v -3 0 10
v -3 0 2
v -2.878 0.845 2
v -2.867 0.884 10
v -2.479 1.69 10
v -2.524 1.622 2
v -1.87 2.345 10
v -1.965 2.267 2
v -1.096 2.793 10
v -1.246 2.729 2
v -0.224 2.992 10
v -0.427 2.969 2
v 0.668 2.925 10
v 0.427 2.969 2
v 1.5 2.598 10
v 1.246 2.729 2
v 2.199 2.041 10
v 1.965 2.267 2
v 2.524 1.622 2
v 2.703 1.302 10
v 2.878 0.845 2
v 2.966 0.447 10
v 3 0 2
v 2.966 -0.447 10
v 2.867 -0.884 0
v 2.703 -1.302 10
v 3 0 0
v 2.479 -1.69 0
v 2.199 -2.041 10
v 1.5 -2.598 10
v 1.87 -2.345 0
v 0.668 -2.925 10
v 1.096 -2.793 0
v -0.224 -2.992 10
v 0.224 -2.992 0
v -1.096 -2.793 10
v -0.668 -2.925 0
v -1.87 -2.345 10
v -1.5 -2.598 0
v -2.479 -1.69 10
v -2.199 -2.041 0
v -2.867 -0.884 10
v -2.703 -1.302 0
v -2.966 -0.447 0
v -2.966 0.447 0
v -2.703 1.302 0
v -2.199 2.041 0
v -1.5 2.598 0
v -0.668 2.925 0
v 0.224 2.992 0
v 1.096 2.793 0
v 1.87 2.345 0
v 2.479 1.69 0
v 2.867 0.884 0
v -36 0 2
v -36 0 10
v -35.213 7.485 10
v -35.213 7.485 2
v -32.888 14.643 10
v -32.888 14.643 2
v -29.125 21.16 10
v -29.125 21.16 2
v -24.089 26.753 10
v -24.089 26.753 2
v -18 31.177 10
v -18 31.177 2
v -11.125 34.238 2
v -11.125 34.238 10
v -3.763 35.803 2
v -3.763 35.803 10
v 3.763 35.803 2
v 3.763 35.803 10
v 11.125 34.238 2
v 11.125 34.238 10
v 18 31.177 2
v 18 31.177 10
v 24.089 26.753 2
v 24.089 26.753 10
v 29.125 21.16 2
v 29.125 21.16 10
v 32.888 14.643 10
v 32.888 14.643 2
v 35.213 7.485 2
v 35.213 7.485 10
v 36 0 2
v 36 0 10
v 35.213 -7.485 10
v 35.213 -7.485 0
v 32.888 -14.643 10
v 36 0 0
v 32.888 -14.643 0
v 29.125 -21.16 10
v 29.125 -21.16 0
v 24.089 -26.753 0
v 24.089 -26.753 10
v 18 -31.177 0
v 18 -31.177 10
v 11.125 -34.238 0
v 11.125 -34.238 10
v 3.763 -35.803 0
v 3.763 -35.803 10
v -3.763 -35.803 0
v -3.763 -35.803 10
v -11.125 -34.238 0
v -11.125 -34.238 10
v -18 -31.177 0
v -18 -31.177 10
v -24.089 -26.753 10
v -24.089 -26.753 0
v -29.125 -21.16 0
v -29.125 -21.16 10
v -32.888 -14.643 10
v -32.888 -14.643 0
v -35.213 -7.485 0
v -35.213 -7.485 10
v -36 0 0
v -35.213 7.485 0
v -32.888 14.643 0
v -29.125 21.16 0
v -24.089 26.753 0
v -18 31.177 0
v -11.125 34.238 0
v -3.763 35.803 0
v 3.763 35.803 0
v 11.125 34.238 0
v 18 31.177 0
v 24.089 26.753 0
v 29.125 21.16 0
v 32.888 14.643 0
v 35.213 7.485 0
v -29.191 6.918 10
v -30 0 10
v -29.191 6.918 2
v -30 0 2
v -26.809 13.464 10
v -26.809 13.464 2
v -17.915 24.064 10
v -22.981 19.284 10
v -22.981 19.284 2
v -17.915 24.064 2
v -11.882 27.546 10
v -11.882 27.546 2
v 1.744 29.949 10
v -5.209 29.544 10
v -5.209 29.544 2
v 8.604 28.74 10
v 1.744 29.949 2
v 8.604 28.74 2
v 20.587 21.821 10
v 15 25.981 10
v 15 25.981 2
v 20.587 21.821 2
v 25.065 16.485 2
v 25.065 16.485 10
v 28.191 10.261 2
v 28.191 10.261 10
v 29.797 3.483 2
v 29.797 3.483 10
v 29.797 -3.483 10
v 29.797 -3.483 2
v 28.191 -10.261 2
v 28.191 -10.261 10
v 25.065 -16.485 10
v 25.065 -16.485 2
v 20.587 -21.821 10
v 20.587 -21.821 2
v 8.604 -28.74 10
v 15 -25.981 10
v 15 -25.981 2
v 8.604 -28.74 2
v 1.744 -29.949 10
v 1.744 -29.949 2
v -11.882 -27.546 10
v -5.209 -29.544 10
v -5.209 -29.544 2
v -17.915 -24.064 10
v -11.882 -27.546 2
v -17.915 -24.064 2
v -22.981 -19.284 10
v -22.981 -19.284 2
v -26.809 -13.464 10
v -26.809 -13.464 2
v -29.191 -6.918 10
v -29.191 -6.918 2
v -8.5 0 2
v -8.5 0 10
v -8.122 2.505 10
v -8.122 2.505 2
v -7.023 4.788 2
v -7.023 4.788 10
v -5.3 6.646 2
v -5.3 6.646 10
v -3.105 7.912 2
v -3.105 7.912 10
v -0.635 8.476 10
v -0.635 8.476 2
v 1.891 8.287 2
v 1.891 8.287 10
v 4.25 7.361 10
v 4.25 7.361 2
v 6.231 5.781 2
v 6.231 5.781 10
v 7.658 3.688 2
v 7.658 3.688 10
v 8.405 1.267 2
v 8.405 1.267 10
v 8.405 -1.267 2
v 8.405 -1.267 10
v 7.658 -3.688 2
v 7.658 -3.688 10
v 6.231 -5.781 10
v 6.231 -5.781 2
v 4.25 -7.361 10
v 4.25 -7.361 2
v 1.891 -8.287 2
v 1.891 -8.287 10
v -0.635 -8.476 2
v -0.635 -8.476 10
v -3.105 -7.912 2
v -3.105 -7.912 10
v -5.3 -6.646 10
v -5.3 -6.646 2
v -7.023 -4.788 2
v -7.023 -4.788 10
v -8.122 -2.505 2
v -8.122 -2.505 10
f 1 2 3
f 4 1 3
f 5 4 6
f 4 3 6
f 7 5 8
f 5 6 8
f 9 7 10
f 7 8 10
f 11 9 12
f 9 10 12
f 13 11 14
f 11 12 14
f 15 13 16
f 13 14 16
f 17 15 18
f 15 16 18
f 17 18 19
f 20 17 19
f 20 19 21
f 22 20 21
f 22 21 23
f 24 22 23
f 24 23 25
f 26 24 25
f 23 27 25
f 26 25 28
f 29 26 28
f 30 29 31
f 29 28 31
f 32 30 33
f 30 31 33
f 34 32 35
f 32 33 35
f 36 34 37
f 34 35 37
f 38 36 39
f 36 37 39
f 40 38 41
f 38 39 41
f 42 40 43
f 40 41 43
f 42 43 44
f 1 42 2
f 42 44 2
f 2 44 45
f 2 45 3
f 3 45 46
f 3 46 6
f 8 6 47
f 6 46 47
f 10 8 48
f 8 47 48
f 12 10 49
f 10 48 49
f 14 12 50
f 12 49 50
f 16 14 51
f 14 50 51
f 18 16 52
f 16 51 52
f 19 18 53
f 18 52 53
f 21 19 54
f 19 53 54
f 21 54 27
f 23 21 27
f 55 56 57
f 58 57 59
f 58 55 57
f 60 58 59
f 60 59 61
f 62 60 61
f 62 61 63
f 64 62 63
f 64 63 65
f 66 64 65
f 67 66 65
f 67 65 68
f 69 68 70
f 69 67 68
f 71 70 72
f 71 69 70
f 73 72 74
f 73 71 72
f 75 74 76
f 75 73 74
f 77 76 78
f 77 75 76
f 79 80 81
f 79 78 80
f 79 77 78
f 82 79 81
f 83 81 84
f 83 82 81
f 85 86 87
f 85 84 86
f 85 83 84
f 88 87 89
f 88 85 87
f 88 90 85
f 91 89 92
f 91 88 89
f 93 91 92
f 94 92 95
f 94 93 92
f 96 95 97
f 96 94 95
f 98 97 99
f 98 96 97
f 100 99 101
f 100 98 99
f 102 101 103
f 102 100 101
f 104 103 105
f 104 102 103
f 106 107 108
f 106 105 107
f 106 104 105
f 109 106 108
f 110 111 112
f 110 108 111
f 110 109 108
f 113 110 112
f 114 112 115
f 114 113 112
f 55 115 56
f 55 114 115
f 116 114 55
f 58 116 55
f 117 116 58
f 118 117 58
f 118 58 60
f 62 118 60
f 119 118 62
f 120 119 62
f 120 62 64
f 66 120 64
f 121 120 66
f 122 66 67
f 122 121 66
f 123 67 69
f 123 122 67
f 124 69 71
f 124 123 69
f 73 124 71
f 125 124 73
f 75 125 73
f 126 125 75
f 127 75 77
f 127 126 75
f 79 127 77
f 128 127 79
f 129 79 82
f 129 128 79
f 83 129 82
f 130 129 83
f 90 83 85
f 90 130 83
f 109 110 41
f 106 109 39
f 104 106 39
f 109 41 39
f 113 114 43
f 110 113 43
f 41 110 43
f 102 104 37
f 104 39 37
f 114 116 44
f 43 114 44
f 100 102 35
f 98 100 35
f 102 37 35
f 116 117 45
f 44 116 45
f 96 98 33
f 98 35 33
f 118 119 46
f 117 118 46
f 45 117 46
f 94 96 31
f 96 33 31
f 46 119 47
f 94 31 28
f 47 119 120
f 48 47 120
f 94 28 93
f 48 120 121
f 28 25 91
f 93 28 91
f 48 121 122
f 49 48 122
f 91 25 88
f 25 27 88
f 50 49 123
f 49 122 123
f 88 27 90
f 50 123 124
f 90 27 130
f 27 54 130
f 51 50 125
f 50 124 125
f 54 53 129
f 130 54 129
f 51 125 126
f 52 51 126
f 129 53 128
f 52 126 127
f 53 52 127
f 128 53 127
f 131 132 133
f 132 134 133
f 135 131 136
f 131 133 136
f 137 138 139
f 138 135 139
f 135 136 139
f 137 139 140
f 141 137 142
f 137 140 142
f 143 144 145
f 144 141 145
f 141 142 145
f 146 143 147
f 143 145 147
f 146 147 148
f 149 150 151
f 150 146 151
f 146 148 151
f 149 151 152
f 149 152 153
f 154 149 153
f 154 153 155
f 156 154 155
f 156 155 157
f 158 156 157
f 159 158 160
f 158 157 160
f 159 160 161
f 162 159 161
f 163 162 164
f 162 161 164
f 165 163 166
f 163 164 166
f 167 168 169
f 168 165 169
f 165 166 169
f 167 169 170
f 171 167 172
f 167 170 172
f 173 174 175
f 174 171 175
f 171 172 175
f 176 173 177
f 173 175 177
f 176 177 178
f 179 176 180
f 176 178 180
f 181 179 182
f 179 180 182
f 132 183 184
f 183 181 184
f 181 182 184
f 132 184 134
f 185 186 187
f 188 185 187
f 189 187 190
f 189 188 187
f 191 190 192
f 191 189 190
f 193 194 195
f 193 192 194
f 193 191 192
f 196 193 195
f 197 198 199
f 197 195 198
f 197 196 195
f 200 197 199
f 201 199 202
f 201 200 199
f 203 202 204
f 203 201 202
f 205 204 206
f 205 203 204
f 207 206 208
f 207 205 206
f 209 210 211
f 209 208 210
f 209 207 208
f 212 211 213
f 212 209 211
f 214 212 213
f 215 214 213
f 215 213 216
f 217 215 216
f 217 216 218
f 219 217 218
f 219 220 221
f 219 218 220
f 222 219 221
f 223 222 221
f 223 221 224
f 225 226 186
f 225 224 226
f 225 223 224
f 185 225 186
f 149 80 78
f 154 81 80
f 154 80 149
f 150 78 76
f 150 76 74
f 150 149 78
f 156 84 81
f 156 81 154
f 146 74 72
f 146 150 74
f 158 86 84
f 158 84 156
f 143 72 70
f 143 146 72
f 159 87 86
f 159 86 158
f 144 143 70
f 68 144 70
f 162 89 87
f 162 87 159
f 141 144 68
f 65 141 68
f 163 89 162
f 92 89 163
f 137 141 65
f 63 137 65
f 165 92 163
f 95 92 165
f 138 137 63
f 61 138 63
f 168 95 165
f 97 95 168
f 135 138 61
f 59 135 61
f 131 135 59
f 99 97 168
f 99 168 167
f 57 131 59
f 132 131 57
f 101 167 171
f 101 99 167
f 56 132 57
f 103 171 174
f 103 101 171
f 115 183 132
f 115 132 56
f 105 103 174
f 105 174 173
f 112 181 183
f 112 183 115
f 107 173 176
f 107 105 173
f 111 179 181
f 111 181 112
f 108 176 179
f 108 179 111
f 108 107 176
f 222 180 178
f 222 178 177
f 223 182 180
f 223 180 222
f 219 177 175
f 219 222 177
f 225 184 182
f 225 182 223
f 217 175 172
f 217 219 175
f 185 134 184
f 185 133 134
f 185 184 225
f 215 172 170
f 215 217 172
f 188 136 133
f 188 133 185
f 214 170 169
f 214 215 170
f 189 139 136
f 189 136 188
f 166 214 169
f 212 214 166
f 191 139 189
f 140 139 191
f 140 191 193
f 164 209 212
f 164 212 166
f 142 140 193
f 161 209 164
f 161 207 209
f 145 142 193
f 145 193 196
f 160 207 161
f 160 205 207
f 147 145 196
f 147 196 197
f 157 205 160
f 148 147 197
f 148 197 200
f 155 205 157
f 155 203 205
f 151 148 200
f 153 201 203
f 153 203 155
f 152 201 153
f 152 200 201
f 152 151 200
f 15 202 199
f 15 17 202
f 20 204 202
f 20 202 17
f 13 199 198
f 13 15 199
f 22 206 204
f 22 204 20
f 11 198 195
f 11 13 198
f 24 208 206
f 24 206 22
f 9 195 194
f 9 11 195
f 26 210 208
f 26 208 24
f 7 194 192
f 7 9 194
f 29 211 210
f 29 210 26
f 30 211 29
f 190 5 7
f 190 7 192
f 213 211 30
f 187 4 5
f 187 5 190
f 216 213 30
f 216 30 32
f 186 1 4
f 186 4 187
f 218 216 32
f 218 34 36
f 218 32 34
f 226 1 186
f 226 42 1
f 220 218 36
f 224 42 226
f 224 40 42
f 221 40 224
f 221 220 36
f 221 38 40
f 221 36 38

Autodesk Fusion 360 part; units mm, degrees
sketch "Sketch1" plane through (0, 0, 0) normal (0, 0, 1) x (1, 0, 0)
  circle A0 centre (0, 0) radius 36
  circle A1 centre (0, 0) radius 3
  dimension "d1" = 72
  dimension "d2" = 6
extrude "Extrude1" add sketch "Sketch1" along normal blind 2
sketch "Sketch2" plane through (0, 0, 2) normal (0, 0, 1) x (-1, 0, 0)
  circle A0 centre (0, 0) radius 3
  circle A1 centre (0, 0) radius 36
  circle A2 centre (0, 0) radius 30
  circle A3 centre (0, 0) radius 8.5
  dimension "d5" = 60
  dimension "d6" = 17
extrude "Extrude2" add sketch "Sketch2" along normal blind 8
